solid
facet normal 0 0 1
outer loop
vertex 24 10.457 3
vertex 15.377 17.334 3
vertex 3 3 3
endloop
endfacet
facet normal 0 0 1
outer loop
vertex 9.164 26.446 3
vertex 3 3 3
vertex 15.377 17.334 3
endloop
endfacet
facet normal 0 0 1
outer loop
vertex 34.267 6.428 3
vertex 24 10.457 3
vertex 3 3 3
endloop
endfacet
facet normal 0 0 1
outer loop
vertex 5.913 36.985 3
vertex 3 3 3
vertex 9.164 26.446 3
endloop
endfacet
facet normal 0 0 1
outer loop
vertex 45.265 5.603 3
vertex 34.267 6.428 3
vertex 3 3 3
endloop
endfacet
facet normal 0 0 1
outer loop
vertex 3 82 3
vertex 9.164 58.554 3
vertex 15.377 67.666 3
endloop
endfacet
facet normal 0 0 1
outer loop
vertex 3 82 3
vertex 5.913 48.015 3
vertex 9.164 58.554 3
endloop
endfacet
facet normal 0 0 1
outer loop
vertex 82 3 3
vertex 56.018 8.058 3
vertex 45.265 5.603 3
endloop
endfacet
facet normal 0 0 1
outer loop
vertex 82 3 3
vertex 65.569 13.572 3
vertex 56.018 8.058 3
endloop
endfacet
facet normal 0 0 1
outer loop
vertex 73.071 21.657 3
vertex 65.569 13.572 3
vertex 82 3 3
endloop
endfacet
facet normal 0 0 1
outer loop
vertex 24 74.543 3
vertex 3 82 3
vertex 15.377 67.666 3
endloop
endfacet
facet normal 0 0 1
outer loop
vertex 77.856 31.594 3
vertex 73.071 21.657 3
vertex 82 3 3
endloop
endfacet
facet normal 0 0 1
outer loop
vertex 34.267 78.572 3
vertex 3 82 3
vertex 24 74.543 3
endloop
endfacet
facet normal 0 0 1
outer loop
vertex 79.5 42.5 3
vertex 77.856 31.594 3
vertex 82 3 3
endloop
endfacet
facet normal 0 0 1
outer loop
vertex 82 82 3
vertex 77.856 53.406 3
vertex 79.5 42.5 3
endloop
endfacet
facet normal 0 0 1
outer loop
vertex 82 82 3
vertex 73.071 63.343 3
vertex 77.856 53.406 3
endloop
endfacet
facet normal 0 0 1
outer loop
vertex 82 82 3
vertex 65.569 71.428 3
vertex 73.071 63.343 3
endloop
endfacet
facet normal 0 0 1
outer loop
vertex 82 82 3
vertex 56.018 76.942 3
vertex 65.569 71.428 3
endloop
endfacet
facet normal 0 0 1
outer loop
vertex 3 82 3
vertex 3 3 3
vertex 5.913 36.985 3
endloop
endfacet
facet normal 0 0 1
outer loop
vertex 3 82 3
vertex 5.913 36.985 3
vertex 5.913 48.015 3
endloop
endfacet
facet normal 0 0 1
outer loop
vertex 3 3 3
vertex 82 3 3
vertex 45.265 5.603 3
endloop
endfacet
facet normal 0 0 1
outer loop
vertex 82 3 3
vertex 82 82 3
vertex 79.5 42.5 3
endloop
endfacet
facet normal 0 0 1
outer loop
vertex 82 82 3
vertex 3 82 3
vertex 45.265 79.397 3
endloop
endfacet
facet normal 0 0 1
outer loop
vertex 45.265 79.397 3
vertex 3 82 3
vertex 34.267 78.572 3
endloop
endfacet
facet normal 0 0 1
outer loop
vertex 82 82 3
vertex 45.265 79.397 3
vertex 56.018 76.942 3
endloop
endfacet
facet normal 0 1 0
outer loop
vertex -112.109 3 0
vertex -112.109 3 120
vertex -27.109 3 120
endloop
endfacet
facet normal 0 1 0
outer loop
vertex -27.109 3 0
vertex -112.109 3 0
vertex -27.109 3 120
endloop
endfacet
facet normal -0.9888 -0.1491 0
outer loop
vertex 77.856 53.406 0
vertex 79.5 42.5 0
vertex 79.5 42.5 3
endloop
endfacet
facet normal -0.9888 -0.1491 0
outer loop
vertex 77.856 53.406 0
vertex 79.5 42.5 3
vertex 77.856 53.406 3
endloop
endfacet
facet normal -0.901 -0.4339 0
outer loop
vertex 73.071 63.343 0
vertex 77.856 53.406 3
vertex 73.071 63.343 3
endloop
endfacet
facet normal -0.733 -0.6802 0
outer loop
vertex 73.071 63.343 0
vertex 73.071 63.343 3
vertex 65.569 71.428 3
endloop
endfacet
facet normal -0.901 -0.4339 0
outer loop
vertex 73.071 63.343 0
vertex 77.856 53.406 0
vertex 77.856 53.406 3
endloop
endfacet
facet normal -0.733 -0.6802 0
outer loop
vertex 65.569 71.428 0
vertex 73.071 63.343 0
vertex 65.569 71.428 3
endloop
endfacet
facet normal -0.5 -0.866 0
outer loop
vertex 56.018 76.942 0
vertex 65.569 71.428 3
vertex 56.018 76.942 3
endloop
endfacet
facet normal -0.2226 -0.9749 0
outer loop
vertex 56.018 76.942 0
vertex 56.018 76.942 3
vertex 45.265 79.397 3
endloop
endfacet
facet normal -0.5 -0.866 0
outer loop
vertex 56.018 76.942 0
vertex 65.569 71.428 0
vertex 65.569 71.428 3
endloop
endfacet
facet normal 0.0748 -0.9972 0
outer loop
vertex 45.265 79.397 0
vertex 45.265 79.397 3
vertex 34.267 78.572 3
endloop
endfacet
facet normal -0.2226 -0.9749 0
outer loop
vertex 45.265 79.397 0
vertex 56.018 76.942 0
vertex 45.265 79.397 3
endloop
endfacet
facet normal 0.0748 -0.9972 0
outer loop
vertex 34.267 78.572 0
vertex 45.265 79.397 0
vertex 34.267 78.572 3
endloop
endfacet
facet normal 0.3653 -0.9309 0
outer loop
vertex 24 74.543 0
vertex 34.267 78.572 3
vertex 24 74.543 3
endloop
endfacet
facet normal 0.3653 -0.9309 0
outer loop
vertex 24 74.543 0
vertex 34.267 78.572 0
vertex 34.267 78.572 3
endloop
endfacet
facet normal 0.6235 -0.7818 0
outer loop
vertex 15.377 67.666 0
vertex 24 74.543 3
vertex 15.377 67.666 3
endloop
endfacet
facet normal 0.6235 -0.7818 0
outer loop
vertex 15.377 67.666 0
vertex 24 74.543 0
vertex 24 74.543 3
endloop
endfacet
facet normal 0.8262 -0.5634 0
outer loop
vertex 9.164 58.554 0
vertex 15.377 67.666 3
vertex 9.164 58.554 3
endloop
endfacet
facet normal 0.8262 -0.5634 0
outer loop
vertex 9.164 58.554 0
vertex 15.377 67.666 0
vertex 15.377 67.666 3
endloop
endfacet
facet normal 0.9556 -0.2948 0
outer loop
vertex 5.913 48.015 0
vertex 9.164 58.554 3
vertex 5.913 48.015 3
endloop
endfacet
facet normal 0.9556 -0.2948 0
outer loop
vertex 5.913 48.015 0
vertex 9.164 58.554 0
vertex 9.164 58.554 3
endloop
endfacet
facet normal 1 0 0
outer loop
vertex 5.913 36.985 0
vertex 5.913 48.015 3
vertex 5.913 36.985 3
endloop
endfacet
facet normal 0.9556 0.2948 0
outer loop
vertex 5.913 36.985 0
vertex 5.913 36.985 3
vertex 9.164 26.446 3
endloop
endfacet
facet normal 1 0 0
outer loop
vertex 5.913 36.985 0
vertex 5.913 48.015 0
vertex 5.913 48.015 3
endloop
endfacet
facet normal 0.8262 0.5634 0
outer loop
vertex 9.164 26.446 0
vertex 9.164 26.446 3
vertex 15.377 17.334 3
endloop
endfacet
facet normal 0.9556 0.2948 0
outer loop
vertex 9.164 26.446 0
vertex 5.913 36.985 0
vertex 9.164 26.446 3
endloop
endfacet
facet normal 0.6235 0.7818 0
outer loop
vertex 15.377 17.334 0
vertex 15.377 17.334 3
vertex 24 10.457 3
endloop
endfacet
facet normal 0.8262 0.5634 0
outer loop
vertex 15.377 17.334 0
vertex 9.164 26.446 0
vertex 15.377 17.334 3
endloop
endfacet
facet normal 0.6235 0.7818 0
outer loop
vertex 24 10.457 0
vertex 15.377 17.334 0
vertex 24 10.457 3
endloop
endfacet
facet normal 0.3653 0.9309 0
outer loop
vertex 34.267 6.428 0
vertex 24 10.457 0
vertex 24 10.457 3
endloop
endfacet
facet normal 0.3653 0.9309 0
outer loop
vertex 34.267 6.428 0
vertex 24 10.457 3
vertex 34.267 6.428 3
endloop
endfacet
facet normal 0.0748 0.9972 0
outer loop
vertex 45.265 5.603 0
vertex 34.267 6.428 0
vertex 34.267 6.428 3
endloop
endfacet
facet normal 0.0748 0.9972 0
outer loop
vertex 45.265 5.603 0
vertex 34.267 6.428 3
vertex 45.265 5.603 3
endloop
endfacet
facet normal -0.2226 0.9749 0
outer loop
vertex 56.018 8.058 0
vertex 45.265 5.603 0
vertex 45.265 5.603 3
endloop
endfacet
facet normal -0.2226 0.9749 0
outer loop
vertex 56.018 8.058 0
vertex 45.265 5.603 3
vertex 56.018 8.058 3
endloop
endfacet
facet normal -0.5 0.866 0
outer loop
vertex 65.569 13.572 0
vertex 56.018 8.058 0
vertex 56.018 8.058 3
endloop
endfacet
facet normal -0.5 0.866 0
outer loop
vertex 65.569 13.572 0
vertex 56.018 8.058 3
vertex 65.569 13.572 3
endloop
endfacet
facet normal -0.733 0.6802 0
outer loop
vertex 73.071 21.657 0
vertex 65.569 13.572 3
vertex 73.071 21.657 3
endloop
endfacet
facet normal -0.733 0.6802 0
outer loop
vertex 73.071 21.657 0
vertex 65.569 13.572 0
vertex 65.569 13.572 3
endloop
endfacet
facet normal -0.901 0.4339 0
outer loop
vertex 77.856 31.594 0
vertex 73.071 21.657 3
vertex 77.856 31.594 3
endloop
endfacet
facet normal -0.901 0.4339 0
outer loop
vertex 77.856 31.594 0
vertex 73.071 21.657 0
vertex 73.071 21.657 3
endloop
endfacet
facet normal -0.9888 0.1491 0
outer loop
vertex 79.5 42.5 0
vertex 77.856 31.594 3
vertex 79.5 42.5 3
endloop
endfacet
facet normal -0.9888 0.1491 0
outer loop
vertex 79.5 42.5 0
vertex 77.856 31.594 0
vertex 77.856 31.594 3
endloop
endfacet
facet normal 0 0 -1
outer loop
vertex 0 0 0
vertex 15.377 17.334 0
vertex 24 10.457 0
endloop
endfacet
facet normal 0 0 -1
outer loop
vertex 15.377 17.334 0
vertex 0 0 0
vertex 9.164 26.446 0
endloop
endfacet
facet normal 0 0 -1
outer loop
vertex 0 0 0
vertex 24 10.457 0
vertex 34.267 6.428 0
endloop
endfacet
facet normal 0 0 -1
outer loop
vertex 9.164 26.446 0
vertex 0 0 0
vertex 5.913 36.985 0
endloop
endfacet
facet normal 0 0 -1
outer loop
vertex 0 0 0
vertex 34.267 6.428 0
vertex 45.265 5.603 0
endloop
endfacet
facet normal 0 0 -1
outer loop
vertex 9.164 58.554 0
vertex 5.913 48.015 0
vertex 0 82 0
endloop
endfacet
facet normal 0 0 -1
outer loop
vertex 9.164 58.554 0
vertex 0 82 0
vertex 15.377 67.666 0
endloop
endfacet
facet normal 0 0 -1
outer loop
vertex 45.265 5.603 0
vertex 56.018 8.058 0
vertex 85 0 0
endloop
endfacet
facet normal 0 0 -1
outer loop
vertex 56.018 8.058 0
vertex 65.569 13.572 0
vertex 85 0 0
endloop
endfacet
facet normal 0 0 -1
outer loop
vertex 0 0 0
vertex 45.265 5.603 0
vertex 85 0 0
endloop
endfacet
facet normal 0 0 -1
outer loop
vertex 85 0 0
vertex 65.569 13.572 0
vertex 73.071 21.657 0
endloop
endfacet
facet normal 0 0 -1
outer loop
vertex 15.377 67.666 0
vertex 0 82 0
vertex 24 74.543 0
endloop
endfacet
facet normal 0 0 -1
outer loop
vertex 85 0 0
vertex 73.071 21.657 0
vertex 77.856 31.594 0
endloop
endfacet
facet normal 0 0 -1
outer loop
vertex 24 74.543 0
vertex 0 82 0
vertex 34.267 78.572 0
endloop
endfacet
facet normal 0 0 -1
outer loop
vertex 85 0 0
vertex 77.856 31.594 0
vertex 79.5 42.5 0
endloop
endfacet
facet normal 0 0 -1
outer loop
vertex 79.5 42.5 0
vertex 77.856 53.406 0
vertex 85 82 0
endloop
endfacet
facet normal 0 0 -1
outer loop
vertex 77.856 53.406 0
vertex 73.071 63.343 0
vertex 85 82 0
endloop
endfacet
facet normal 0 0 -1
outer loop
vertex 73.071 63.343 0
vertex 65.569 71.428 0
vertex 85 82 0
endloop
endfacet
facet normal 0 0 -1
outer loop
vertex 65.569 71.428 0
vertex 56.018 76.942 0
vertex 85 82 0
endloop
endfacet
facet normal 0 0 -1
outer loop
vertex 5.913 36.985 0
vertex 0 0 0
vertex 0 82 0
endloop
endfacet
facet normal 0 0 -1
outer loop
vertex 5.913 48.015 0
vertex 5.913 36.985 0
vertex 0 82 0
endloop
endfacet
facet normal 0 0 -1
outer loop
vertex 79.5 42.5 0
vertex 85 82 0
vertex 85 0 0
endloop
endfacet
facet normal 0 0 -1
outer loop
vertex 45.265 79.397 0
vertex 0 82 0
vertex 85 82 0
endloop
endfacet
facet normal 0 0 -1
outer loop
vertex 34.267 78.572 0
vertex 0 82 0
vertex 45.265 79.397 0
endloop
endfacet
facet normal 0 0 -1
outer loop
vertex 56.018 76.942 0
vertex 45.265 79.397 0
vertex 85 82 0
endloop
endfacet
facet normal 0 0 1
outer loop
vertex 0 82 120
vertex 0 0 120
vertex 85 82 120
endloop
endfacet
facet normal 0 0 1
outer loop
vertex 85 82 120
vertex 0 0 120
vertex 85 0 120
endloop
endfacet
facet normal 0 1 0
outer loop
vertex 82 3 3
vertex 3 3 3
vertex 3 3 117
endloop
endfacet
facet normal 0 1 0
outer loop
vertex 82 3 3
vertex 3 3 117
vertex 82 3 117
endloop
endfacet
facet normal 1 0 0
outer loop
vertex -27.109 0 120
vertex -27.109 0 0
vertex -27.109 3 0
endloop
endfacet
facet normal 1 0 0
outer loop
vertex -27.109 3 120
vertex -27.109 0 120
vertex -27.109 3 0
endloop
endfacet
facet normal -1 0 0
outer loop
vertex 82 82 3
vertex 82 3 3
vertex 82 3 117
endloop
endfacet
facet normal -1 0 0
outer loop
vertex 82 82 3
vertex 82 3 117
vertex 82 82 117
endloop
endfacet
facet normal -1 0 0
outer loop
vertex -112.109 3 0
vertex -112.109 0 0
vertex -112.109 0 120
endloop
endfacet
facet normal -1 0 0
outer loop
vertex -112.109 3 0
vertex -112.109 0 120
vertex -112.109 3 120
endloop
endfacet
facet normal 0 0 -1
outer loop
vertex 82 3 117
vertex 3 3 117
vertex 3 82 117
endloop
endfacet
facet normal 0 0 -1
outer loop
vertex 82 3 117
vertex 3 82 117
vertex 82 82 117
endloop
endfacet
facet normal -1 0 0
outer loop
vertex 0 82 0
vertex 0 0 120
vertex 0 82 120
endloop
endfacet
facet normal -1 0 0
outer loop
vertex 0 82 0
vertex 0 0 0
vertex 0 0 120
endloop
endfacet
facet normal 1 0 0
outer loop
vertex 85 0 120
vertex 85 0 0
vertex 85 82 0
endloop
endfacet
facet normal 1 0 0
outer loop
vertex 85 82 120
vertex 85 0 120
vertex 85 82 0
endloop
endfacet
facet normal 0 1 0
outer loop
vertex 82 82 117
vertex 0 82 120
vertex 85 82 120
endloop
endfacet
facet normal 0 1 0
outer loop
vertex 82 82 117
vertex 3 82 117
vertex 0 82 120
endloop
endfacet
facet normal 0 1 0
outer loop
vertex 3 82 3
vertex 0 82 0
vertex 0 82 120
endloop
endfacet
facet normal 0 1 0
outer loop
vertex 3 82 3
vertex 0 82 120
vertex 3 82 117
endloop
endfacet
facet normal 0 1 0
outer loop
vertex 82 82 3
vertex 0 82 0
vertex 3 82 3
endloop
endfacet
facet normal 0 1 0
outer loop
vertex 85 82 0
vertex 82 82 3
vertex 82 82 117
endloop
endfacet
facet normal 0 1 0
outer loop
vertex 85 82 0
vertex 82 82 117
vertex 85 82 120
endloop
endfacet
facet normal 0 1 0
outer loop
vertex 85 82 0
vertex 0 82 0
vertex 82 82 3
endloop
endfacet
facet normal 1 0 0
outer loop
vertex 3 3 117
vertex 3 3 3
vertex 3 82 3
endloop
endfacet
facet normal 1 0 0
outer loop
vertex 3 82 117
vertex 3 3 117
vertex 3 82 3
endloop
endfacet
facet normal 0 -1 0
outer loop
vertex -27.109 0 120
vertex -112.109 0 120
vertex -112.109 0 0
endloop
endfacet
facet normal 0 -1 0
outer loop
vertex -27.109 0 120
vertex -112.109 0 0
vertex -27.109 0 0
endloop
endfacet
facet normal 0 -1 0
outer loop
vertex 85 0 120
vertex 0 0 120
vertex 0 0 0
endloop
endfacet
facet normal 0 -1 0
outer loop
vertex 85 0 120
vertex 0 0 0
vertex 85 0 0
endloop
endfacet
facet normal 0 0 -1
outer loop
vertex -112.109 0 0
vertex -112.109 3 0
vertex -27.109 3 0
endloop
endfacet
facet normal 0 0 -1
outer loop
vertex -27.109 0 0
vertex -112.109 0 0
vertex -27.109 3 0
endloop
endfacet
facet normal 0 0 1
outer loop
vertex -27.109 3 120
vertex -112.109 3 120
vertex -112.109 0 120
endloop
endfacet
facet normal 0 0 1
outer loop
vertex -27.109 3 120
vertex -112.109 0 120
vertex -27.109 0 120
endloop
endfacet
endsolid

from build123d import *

# Parameters (mm, degrees)
SKETCH2_W           = 85
SKETCH2_H           = 82
SKETCH2_R           = 37
BOSS_EXTRUDE1_DEPTH = 3
SKETCH7_W           = 3
SKETCH7_H           = 82
BOSS_EXTRUDE2_DEPTH = 117
SKETCH8_W           = 82
SKETCH8_H           = 3
BOSS_EXTRUDE3_DEPTH = 117
SKETCH10_W          = 3
SKETCH10_H          = 79
BOSS_EXTRUDE4_DEPTH = 117
SKETCH11_W          = 79
SKETCH11_H          = 3
BOSS_EXTRUDE5_DEPTH = 79
SKETCH13_W          = 85
SKETCH13_H          = 3
BOSS_EXTRUDE6_DEPTH = 120


with BuildPart() as part:
    # Sketch2 → Boss-Extrude1 (new body)
    with BuildSketch(Plane.XY):
        with Locations((42.5, 41)):
            Rectangle(SKETCH2_W, SKETCH2_H)
        with Locations((42.5, 42.5)):
            Circle(SKETCH2_R, mode=Mode.SUBTRACT)
    extrude(amount=BOSS_EXTRUDE1_DEPTH)

    # Sketch7 → Boss-Extrude2 (add)
    with BuildSketch(Plane.XY.offset(3)):
        with Locations((1.5, 41)):
            Rectangle(SKETCH7_W, SKETCH7_H)
    extrude(amount=BOSS_EXTRUDE2_DEPTH)

    # Sketch8 → Boss-Extrude3 (add)
    with BuildSketch(Plane.XY.offset(3)):
        with Locations((44, 1.5)):
            Rectangle(SKETCH8_W, SKETCH8_H)
    extrude(amount=BOSS_EXTRUDE3_DEPTH)

    # Sketch10 → Boss-Extrude4 (add)
    with BuildSketch(Plane.XY.offset(3)):
        with Locations((83.5, 42.5)):
            Rectangle(SKETCH10_W, SKETCH10_H)
    extrude(amount=BOSS_EXTRUDE4_DEPTH)

    # Sketch11 → Boss-Extrude5 (add)
    with BuildSketch(Plane(origin=(0, 3, 0), x_dir=(1, 0, 0), z_dir=(0, 1, 0))):
        with Locations((42.5, -118.5)):
            Rectangle(SKETCH11_W, SKETCH11_H)
    extrude(amount=BOSS_EXTRUDE5_DEPTH)


with BuildPart() as body_2:
    # Sketch13 → Boss-Extrude6 (new body)
    with BuildSketch(Plane.XY):
        with Locations((-69.608594637, 1.5)):
            Rectangle(SKETCH13_W, SKETCH13_H)
    extrude(amount=BOSS_EXTRUDE6_DEPTH)


solid = Compound([part.part, body_2.part])
